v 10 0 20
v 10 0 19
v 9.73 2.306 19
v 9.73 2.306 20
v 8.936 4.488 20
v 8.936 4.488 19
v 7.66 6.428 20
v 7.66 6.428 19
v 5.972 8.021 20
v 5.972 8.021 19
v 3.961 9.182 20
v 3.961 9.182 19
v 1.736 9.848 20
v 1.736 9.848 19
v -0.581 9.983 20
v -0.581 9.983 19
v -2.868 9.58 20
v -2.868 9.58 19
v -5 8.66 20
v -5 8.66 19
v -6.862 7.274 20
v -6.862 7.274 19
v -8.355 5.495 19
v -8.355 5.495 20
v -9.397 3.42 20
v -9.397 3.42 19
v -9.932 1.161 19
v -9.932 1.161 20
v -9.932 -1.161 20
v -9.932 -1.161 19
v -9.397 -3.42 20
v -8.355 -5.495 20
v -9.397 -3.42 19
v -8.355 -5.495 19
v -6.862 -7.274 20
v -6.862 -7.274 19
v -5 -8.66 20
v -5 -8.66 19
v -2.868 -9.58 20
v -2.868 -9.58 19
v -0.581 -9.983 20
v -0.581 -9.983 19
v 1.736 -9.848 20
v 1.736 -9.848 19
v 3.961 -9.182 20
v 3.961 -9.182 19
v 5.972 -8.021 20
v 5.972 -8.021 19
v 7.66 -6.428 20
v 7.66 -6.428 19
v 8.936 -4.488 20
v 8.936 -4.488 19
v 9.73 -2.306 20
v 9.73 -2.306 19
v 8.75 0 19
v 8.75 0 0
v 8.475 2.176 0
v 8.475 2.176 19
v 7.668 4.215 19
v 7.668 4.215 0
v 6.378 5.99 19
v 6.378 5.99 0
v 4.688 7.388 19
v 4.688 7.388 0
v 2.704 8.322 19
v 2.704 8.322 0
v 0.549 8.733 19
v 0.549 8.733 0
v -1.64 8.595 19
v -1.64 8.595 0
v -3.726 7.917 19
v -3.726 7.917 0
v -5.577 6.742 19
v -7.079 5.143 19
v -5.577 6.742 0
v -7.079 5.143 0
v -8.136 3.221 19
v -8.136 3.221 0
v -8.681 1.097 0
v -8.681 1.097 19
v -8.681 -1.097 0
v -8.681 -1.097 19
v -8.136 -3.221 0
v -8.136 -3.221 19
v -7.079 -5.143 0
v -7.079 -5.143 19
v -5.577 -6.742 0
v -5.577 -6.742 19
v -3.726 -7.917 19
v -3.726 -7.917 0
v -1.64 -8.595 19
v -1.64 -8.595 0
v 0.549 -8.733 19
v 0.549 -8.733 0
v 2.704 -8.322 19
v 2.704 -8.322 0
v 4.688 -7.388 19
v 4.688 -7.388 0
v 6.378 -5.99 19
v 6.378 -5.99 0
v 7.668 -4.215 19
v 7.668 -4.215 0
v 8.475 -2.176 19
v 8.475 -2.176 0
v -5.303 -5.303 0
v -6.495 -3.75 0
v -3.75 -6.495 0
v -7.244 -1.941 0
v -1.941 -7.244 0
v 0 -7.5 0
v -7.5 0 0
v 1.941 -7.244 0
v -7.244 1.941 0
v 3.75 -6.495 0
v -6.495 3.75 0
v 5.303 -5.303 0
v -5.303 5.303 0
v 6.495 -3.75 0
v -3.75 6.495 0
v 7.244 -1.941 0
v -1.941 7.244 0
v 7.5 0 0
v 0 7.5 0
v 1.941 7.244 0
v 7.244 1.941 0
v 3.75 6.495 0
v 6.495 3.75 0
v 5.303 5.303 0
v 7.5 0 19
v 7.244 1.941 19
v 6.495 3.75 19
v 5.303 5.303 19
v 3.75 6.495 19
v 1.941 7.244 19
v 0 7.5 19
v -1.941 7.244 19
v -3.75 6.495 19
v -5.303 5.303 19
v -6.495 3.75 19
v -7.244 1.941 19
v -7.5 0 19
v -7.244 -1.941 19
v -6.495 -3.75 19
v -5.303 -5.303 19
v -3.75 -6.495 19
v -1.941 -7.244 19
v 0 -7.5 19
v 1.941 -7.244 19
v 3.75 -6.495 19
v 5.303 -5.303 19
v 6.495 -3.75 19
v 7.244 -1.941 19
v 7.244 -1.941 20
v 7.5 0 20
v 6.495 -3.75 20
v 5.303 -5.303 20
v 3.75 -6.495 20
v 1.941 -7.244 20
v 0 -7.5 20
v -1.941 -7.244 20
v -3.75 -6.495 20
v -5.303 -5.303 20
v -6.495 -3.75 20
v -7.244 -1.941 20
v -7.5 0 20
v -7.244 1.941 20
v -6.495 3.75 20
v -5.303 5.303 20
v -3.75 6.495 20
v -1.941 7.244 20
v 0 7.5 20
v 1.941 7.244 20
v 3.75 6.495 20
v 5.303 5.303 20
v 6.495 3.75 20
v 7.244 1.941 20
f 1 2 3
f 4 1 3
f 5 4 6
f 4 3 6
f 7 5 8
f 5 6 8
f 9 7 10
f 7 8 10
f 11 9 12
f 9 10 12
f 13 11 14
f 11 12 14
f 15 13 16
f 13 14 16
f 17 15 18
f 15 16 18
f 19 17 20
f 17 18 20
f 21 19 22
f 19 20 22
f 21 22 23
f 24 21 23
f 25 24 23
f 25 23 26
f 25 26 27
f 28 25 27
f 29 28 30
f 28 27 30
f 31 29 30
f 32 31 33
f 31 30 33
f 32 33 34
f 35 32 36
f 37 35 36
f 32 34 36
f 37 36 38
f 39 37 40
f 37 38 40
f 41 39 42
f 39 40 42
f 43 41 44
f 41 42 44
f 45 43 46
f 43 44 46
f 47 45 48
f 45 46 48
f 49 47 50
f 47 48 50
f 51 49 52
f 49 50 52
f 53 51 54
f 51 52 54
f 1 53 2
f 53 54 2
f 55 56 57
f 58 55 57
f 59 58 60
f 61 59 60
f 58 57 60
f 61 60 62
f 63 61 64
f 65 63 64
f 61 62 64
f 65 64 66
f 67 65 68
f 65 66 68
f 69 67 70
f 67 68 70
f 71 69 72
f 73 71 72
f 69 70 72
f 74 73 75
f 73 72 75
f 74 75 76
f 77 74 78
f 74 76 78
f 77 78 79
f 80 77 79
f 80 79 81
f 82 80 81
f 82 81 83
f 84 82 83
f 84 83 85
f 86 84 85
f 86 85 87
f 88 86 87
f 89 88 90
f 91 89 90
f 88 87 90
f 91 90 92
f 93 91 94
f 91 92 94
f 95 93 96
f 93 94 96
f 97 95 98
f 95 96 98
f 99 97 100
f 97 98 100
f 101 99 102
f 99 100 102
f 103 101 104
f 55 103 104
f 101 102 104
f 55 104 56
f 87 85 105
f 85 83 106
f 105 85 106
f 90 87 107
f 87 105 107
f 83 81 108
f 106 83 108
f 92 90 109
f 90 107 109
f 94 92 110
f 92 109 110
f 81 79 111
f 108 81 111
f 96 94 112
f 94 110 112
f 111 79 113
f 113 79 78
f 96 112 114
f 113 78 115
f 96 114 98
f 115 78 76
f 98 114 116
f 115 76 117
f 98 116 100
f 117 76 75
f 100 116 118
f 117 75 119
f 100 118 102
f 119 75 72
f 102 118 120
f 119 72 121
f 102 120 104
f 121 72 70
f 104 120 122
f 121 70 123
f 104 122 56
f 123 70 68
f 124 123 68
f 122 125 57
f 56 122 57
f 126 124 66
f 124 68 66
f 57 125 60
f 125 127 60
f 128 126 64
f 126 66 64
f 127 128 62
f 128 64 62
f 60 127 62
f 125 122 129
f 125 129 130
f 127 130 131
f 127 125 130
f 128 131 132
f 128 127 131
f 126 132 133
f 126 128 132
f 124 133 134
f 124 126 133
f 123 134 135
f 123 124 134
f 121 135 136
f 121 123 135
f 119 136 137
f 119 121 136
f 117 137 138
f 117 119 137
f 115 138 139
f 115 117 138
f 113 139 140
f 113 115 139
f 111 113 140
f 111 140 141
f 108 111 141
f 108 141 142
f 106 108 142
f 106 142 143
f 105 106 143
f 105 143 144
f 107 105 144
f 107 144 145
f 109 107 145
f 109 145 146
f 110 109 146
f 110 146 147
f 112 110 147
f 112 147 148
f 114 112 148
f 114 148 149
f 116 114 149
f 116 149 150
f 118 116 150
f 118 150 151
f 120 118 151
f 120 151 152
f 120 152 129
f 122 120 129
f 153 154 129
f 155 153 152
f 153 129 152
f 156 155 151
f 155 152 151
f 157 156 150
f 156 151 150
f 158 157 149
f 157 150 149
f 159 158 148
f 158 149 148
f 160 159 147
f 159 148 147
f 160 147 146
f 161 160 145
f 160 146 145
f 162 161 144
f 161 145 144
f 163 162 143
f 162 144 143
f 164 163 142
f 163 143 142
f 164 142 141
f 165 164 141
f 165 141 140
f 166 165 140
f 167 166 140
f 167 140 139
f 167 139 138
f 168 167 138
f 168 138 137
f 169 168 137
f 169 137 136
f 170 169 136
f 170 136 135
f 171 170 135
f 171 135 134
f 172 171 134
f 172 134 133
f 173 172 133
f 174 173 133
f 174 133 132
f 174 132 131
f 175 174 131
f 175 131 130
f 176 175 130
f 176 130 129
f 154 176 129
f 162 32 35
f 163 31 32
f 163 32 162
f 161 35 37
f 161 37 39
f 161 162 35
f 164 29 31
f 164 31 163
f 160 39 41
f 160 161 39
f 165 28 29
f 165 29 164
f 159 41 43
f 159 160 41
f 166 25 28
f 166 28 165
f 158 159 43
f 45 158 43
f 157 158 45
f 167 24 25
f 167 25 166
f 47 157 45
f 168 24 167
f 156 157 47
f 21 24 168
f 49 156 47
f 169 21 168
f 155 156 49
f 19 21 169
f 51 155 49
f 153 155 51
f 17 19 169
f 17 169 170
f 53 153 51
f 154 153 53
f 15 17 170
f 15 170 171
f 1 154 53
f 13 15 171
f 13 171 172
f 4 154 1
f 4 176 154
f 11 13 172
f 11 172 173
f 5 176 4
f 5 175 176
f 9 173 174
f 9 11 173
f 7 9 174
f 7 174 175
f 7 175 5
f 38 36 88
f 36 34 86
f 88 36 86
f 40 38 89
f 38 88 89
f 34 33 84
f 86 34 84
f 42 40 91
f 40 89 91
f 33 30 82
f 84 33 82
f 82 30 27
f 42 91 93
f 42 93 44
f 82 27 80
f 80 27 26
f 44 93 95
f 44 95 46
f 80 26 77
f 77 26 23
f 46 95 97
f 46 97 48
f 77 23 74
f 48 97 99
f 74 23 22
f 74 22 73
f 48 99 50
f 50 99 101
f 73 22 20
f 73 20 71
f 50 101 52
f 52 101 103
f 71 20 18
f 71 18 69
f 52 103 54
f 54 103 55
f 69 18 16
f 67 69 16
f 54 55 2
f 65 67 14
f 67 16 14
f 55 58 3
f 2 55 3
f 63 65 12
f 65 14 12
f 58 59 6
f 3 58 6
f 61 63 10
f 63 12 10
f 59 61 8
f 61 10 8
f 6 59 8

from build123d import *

# Parameters (mm, degrees)
F0_R     = 8.75
F1_DEPTH = 19
F2_T     = -1.25
F3_R     = 10
F4_DEPTH = 1
F5_R     = 7.5
F6_DEPTH = 1.001


with BuildPart() as f1:
    # F0 (on Top) → F1 (new body)
    with BuildSketch(Plane.XY):
        Circle(F0_R)
    extrude(amount=F1_DEPTH)

    # F2
    f2_openings = [f1.faces().sort_by_distance(p)[0] for p in [
        (0, 0, 19),
        (0, 0, 0),
    ]]
    offset(amount=F2_T, openings=f2_openings)

    # F3 (on face) → F4 (join)
    with BuildSketch(Plane.XY.offset(19)):
        Circle(F3_R)
    extrude(amount=F4_DEPTH)

    # F5 (on face) → F6 (cut, through all)
    with BuildSketch(Plane(origin=(0, 0, 19), x_dir=(1, 0, 0), z_dir=(0, 0, -1))):
        Circle(F5_R)
    extrude(amount=-F6_DEPTH, mode=Mode.SUBTRACT)


solid = f1.part
